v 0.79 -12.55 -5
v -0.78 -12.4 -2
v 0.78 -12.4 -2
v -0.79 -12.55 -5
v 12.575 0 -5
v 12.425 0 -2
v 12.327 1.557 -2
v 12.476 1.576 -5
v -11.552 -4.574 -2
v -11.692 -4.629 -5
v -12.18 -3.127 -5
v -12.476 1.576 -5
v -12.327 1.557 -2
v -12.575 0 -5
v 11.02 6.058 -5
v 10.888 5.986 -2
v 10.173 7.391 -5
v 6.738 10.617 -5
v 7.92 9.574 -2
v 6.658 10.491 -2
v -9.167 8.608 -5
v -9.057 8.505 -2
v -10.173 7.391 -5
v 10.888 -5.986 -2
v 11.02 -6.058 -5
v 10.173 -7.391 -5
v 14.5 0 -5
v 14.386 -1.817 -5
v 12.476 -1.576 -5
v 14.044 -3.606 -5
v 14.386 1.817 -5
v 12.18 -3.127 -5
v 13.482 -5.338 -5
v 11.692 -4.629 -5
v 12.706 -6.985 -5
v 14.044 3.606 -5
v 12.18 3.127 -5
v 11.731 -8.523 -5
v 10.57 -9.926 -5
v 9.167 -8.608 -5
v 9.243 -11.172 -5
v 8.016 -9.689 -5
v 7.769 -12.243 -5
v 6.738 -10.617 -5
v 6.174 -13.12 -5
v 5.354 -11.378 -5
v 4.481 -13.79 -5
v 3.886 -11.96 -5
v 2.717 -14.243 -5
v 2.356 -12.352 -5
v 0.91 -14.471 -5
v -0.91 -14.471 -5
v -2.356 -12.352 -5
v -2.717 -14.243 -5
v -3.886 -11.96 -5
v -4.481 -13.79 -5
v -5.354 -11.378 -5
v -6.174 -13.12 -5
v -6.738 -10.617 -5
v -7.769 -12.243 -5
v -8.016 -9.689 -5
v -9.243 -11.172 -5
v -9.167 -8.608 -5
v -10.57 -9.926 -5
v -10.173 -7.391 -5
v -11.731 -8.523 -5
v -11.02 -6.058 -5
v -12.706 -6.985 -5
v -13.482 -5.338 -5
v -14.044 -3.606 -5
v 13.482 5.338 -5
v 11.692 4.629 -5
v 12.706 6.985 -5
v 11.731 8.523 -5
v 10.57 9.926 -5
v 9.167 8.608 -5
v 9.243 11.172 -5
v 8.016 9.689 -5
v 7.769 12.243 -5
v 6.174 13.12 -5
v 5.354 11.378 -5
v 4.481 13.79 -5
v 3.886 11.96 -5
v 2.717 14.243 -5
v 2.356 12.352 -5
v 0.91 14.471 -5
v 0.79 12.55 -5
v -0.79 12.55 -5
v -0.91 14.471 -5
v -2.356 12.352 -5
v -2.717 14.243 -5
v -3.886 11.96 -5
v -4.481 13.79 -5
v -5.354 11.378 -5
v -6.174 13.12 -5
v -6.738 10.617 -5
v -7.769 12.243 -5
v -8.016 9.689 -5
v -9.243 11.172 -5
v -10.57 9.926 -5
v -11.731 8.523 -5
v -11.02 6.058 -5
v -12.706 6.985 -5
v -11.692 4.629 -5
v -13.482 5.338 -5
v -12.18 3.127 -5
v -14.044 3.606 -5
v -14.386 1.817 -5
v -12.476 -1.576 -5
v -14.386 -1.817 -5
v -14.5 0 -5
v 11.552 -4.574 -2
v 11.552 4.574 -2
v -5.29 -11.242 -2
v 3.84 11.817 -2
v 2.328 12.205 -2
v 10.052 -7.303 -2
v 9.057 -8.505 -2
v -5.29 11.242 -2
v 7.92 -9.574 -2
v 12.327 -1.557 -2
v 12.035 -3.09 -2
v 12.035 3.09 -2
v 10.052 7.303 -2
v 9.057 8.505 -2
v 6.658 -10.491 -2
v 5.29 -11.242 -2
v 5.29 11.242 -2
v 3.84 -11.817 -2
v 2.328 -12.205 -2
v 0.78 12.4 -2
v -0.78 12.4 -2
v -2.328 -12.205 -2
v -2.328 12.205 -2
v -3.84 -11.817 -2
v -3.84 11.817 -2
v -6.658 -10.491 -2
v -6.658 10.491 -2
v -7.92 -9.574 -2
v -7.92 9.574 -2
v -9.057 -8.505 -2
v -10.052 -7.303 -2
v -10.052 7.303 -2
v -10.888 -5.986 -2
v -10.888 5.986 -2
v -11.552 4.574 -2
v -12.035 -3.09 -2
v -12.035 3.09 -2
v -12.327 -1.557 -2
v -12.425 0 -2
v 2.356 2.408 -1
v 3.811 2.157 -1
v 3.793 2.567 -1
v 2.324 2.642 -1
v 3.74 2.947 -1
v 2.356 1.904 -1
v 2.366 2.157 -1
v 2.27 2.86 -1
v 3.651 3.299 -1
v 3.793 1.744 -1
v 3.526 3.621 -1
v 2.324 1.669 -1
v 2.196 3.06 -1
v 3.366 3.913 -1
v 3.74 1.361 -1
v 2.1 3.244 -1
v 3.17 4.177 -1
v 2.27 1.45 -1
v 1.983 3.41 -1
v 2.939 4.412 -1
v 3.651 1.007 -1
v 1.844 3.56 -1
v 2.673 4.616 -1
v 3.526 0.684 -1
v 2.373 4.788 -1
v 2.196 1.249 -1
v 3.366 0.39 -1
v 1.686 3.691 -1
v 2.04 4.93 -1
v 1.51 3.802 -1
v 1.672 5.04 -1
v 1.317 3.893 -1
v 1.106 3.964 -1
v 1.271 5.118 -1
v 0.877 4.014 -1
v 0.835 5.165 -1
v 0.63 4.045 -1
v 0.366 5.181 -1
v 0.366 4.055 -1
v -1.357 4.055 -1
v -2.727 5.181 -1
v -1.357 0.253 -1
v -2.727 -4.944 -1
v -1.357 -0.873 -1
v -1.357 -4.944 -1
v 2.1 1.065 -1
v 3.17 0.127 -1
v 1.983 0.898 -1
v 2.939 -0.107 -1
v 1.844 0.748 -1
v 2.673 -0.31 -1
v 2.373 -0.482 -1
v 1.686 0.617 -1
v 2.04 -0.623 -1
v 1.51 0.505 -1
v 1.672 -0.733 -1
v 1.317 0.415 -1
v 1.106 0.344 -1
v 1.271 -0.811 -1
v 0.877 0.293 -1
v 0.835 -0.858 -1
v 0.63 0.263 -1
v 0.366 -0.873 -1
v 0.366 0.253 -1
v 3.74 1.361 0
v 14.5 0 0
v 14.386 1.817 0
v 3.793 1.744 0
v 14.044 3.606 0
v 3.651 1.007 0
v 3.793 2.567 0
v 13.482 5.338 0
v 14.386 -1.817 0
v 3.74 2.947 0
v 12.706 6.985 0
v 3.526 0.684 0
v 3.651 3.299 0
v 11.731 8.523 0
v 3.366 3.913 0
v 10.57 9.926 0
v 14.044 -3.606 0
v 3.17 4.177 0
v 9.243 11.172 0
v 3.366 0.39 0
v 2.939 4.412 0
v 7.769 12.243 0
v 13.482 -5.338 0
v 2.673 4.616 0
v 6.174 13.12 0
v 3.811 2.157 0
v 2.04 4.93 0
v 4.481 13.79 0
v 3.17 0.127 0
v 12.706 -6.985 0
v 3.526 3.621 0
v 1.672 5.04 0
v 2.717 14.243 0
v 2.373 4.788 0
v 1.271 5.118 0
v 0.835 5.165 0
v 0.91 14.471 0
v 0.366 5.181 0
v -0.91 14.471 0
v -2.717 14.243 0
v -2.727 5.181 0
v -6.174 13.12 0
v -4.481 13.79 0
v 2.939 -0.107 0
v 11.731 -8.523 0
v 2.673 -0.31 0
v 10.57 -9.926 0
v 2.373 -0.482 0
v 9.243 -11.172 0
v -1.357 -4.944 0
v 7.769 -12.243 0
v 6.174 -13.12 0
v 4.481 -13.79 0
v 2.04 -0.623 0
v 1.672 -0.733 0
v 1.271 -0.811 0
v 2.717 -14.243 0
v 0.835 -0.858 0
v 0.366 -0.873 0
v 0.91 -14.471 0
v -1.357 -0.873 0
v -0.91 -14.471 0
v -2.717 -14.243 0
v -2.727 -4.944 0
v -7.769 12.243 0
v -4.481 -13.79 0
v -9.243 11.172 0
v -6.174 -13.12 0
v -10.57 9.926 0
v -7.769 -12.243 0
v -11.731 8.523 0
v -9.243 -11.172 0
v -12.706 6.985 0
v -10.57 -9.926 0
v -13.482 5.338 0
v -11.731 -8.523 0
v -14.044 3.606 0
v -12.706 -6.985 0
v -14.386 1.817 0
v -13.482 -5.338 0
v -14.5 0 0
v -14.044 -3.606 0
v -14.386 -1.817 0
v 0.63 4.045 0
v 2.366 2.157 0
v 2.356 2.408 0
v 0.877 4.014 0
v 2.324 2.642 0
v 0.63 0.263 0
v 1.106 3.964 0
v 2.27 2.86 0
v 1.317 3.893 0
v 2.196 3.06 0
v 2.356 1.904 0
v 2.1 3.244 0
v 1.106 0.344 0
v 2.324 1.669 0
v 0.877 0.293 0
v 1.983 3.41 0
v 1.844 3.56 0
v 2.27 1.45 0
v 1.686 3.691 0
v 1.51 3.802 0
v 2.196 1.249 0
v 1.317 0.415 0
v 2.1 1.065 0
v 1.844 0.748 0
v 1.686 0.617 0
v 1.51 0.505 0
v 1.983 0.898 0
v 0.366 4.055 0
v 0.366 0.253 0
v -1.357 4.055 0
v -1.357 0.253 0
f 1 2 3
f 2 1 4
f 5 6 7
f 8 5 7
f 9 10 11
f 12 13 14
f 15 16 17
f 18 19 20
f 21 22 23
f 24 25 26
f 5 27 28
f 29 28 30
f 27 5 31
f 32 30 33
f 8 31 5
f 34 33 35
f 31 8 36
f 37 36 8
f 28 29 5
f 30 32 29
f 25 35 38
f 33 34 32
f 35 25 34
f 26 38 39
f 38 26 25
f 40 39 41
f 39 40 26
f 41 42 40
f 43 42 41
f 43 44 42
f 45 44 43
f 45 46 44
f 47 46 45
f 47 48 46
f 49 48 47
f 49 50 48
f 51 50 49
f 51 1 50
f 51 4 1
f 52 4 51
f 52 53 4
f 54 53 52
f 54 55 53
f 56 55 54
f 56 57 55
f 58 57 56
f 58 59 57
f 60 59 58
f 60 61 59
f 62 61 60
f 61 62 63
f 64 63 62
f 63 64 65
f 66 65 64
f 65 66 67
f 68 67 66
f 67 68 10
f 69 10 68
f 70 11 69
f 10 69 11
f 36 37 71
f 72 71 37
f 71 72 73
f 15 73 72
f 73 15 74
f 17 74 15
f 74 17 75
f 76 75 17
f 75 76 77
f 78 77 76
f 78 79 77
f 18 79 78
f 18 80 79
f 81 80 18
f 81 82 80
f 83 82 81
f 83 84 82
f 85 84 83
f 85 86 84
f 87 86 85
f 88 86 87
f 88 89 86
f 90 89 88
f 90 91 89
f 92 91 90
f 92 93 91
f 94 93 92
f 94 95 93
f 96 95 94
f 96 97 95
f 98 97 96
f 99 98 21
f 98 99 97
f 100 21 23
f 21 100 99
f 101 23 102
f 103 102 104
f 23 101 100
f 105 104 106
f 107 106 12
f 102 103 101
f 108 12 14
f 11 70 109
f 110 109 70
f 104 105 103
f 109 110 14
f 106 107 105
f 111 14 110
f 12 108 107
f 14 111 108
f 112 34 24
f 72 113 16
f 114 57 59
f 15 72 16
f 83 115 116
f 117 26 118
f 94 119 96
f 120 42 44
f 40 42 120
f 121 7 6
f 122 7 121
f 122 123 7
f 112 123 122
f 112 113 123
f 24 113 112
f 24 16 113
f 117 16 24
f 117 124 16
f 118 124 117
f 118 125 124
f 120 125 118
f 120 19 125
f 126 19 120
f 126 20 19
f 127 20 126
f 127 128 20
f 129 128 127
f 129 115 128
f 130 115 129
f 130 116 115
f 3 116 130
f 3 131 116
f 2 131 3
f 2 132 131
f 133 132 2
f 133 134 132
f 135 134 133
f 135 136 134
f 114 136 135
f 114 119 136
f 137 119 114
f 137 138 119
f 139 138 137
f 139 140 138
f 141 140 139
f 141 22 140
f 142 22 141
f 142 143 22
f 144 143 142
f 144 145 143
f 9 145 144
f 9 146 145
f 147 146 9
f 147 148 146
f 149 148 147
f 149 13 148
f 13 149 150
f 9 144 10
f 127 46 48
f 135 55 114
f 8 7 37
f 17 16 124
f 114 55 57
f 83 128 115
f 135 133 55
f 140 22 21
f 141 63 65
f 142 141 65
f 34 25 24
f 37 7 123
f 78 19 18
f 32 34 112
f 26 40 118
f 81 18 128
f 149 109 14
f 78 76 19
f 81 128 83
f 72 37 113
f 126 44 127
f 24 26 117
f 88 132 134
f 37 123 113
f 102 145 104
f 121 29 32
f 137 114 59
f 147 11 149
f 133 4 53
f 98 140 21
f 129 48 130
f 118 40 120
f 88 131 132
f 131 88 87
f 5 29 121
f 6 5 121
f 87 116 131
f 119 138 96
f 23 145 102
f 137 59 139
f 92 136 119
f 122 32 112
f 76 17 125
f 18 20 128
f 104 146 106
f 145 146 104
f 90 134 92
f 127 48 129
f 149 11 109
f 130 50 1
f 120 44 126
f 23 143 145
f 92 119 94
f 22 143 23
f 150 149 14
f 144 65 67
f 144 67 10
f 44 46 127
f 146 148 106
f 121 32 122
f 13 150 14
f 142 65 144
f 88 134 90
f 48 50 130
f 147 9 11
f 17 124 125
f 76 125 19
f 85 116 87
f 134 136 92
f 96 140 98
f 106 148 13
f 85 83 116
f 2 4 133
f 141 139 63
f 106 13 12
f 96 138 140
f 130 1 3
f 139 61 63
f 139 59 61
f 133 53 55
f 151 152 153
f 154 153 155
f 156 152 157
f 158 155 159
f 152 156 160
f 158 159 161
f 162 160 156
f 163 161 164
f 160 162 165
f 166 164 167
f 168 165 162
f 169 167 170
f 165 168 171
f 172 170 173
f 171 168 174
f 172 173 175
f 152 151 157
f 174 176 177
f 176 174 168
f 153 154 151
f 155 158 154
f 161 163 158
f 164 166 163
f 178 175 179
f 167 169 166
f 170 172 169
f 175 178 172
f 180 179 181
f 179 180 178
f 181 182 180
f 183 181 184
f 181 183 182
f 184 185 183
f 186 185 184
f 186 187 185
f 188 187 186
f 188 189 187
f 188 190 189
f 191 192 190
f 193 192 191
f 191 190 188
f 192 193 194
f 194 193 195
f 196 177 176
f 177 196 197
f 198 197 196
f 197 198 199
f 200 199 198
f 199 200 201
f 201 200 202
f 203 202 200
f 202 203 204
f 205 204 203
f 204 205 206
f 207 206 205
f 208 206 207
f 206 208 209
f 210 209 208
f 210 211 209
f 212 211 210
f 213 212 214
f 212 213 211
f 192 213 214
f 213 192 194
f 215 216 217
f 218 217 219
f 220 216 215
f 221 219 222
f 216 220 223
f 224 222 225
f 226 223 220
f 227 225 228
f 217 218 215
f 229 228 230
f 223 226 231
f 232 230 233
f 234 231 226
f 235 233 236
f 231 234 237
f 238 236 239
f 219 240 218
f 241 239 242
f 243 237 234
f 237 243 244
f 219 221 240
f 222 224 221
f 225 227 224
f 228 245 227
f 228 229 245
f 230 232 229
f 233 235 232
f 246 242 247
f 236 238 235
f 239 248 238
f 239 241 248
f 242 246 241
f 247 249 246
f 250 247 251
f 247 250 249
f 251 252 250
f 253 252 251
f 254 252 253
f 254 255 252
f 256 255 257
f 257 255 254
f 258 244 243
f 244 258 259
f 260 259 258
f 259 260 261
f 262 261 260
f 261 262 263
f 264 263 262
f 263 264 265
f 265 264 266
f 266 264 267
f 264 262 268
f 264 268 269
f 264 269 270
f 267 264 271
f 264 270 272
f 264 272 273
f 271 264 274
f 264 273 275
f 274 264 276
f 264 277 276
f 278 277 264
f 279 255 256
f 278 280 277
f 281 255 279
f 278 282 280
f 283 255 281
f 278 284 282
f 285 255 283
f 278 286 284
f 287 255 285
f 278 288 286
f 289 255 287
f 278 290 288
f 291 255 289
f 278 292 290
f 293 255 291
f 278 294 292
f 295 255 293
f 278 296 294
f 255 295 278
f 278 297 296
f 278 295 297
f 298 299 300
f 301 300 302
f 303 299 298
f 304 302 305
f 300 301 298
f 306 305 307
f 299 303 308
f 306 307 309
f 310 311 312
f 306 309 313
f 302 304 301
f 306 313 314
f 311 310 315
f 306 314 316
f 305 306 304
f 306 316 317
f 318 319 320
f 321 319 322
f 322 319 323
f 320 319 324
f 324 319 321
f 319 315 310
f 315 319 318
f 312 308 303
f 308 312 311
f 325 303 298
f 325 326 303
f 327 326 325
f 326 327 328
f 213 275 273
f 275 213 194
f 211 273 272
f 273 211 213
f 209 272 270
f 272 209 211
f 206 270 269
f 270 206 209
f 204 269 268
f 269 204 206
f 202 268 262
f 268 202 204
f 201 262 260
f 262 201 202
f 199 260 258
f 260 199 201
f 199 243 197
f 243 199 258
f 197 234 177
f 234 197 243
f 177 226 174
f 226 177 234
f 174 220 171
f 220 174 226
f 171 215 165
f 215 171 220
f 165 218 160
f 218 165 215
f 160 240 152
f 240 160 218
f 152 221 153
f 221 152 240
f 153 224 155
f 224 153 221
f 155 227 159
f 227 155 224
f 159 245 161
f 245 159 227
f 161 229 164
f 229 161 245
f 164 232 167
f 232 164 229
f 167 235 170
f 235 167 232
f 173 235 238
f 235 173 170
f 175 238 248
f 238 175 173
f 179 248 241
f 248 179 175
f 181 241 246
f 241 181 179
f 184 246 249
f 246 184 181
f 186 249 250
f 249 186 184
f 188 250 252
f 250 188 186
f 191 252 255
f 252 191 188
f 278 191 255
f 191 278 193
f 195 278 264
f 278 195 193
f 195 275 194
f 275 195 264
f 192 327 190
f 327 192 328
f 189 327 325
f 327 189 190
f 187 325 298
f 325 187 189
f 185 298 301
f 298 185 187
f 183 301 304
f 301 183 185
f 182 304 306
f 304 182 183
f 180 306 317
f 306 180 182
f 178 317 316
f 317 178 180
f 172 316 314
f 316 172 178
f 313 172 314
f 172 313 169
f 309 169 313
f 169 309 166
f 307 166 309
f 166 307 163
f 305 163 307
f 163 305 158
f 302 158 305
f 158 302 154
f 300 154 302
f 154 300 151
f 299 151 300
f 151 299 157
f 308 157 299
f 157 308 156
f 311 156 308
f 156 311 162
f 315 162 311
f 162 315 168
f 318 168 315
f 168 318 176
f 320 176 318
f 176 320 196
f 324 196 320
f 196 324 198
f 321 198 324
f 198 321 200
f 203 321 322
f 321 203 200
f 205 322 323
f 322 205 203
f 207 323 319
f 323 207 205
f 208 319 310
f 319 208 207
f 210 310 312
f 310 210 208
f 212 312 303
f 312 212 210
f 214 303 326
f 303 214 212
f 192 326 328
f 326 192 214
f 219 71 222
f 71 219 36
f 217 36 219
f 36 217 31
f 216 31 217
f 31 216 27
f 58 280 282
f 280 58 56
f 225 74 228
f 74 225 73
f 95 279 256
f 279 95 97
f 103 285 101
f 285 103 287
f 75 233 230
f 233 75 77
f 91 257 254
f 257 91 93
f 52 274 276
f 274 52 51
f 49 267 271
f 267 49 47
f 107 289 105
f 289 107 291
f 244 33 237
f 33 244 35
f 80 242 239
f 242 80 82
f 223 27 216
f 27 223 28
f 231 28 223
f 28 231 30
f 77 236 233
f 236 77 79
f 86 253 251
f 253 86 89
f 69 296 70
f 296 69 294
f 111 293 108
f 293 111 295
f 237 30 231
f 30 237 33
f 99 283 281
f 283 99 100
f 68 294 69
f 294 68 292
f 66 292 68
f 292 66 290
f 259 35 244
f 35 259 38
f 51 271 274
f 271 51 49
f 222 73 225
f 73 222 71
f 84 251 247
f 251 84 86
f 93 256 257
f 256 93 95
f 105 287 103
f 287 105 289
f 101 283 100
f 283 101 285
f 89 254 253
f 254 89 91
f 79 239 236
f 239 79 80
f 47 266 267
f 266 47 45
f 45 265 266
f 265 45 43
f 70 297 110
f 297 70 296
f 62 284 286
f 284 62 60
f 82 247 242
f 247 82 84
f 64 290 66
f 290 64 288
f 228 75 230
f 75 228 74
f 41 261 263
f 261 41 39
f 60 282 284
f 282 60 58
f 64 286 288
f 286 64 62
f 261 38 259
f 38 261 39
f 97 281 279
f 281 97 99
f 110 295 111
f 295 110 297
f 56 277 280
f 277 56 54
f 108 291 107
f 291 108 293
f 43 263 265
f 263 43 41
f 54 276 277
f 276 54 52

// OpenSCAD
$fn = 50;


difference() {
	union() {
		translate(v = [0, 0, -5.0000000000]) {
			cylinder(h = 5, r = 14.5000000000);
		}
	}
	union() {
		#translate(v = [0, 0, -5.0000000000]) {
			cylinder(h = 3, r1 = 12.5750000000, r2 = 12.4250000000);
		}
		translate(v = [0, 0, -1]) {
			linear_extrude(height = 1) {
				text(font = "Impact", halign = "center", size = 10, text = "P", valign = "center");
			}
		}
	}
}
